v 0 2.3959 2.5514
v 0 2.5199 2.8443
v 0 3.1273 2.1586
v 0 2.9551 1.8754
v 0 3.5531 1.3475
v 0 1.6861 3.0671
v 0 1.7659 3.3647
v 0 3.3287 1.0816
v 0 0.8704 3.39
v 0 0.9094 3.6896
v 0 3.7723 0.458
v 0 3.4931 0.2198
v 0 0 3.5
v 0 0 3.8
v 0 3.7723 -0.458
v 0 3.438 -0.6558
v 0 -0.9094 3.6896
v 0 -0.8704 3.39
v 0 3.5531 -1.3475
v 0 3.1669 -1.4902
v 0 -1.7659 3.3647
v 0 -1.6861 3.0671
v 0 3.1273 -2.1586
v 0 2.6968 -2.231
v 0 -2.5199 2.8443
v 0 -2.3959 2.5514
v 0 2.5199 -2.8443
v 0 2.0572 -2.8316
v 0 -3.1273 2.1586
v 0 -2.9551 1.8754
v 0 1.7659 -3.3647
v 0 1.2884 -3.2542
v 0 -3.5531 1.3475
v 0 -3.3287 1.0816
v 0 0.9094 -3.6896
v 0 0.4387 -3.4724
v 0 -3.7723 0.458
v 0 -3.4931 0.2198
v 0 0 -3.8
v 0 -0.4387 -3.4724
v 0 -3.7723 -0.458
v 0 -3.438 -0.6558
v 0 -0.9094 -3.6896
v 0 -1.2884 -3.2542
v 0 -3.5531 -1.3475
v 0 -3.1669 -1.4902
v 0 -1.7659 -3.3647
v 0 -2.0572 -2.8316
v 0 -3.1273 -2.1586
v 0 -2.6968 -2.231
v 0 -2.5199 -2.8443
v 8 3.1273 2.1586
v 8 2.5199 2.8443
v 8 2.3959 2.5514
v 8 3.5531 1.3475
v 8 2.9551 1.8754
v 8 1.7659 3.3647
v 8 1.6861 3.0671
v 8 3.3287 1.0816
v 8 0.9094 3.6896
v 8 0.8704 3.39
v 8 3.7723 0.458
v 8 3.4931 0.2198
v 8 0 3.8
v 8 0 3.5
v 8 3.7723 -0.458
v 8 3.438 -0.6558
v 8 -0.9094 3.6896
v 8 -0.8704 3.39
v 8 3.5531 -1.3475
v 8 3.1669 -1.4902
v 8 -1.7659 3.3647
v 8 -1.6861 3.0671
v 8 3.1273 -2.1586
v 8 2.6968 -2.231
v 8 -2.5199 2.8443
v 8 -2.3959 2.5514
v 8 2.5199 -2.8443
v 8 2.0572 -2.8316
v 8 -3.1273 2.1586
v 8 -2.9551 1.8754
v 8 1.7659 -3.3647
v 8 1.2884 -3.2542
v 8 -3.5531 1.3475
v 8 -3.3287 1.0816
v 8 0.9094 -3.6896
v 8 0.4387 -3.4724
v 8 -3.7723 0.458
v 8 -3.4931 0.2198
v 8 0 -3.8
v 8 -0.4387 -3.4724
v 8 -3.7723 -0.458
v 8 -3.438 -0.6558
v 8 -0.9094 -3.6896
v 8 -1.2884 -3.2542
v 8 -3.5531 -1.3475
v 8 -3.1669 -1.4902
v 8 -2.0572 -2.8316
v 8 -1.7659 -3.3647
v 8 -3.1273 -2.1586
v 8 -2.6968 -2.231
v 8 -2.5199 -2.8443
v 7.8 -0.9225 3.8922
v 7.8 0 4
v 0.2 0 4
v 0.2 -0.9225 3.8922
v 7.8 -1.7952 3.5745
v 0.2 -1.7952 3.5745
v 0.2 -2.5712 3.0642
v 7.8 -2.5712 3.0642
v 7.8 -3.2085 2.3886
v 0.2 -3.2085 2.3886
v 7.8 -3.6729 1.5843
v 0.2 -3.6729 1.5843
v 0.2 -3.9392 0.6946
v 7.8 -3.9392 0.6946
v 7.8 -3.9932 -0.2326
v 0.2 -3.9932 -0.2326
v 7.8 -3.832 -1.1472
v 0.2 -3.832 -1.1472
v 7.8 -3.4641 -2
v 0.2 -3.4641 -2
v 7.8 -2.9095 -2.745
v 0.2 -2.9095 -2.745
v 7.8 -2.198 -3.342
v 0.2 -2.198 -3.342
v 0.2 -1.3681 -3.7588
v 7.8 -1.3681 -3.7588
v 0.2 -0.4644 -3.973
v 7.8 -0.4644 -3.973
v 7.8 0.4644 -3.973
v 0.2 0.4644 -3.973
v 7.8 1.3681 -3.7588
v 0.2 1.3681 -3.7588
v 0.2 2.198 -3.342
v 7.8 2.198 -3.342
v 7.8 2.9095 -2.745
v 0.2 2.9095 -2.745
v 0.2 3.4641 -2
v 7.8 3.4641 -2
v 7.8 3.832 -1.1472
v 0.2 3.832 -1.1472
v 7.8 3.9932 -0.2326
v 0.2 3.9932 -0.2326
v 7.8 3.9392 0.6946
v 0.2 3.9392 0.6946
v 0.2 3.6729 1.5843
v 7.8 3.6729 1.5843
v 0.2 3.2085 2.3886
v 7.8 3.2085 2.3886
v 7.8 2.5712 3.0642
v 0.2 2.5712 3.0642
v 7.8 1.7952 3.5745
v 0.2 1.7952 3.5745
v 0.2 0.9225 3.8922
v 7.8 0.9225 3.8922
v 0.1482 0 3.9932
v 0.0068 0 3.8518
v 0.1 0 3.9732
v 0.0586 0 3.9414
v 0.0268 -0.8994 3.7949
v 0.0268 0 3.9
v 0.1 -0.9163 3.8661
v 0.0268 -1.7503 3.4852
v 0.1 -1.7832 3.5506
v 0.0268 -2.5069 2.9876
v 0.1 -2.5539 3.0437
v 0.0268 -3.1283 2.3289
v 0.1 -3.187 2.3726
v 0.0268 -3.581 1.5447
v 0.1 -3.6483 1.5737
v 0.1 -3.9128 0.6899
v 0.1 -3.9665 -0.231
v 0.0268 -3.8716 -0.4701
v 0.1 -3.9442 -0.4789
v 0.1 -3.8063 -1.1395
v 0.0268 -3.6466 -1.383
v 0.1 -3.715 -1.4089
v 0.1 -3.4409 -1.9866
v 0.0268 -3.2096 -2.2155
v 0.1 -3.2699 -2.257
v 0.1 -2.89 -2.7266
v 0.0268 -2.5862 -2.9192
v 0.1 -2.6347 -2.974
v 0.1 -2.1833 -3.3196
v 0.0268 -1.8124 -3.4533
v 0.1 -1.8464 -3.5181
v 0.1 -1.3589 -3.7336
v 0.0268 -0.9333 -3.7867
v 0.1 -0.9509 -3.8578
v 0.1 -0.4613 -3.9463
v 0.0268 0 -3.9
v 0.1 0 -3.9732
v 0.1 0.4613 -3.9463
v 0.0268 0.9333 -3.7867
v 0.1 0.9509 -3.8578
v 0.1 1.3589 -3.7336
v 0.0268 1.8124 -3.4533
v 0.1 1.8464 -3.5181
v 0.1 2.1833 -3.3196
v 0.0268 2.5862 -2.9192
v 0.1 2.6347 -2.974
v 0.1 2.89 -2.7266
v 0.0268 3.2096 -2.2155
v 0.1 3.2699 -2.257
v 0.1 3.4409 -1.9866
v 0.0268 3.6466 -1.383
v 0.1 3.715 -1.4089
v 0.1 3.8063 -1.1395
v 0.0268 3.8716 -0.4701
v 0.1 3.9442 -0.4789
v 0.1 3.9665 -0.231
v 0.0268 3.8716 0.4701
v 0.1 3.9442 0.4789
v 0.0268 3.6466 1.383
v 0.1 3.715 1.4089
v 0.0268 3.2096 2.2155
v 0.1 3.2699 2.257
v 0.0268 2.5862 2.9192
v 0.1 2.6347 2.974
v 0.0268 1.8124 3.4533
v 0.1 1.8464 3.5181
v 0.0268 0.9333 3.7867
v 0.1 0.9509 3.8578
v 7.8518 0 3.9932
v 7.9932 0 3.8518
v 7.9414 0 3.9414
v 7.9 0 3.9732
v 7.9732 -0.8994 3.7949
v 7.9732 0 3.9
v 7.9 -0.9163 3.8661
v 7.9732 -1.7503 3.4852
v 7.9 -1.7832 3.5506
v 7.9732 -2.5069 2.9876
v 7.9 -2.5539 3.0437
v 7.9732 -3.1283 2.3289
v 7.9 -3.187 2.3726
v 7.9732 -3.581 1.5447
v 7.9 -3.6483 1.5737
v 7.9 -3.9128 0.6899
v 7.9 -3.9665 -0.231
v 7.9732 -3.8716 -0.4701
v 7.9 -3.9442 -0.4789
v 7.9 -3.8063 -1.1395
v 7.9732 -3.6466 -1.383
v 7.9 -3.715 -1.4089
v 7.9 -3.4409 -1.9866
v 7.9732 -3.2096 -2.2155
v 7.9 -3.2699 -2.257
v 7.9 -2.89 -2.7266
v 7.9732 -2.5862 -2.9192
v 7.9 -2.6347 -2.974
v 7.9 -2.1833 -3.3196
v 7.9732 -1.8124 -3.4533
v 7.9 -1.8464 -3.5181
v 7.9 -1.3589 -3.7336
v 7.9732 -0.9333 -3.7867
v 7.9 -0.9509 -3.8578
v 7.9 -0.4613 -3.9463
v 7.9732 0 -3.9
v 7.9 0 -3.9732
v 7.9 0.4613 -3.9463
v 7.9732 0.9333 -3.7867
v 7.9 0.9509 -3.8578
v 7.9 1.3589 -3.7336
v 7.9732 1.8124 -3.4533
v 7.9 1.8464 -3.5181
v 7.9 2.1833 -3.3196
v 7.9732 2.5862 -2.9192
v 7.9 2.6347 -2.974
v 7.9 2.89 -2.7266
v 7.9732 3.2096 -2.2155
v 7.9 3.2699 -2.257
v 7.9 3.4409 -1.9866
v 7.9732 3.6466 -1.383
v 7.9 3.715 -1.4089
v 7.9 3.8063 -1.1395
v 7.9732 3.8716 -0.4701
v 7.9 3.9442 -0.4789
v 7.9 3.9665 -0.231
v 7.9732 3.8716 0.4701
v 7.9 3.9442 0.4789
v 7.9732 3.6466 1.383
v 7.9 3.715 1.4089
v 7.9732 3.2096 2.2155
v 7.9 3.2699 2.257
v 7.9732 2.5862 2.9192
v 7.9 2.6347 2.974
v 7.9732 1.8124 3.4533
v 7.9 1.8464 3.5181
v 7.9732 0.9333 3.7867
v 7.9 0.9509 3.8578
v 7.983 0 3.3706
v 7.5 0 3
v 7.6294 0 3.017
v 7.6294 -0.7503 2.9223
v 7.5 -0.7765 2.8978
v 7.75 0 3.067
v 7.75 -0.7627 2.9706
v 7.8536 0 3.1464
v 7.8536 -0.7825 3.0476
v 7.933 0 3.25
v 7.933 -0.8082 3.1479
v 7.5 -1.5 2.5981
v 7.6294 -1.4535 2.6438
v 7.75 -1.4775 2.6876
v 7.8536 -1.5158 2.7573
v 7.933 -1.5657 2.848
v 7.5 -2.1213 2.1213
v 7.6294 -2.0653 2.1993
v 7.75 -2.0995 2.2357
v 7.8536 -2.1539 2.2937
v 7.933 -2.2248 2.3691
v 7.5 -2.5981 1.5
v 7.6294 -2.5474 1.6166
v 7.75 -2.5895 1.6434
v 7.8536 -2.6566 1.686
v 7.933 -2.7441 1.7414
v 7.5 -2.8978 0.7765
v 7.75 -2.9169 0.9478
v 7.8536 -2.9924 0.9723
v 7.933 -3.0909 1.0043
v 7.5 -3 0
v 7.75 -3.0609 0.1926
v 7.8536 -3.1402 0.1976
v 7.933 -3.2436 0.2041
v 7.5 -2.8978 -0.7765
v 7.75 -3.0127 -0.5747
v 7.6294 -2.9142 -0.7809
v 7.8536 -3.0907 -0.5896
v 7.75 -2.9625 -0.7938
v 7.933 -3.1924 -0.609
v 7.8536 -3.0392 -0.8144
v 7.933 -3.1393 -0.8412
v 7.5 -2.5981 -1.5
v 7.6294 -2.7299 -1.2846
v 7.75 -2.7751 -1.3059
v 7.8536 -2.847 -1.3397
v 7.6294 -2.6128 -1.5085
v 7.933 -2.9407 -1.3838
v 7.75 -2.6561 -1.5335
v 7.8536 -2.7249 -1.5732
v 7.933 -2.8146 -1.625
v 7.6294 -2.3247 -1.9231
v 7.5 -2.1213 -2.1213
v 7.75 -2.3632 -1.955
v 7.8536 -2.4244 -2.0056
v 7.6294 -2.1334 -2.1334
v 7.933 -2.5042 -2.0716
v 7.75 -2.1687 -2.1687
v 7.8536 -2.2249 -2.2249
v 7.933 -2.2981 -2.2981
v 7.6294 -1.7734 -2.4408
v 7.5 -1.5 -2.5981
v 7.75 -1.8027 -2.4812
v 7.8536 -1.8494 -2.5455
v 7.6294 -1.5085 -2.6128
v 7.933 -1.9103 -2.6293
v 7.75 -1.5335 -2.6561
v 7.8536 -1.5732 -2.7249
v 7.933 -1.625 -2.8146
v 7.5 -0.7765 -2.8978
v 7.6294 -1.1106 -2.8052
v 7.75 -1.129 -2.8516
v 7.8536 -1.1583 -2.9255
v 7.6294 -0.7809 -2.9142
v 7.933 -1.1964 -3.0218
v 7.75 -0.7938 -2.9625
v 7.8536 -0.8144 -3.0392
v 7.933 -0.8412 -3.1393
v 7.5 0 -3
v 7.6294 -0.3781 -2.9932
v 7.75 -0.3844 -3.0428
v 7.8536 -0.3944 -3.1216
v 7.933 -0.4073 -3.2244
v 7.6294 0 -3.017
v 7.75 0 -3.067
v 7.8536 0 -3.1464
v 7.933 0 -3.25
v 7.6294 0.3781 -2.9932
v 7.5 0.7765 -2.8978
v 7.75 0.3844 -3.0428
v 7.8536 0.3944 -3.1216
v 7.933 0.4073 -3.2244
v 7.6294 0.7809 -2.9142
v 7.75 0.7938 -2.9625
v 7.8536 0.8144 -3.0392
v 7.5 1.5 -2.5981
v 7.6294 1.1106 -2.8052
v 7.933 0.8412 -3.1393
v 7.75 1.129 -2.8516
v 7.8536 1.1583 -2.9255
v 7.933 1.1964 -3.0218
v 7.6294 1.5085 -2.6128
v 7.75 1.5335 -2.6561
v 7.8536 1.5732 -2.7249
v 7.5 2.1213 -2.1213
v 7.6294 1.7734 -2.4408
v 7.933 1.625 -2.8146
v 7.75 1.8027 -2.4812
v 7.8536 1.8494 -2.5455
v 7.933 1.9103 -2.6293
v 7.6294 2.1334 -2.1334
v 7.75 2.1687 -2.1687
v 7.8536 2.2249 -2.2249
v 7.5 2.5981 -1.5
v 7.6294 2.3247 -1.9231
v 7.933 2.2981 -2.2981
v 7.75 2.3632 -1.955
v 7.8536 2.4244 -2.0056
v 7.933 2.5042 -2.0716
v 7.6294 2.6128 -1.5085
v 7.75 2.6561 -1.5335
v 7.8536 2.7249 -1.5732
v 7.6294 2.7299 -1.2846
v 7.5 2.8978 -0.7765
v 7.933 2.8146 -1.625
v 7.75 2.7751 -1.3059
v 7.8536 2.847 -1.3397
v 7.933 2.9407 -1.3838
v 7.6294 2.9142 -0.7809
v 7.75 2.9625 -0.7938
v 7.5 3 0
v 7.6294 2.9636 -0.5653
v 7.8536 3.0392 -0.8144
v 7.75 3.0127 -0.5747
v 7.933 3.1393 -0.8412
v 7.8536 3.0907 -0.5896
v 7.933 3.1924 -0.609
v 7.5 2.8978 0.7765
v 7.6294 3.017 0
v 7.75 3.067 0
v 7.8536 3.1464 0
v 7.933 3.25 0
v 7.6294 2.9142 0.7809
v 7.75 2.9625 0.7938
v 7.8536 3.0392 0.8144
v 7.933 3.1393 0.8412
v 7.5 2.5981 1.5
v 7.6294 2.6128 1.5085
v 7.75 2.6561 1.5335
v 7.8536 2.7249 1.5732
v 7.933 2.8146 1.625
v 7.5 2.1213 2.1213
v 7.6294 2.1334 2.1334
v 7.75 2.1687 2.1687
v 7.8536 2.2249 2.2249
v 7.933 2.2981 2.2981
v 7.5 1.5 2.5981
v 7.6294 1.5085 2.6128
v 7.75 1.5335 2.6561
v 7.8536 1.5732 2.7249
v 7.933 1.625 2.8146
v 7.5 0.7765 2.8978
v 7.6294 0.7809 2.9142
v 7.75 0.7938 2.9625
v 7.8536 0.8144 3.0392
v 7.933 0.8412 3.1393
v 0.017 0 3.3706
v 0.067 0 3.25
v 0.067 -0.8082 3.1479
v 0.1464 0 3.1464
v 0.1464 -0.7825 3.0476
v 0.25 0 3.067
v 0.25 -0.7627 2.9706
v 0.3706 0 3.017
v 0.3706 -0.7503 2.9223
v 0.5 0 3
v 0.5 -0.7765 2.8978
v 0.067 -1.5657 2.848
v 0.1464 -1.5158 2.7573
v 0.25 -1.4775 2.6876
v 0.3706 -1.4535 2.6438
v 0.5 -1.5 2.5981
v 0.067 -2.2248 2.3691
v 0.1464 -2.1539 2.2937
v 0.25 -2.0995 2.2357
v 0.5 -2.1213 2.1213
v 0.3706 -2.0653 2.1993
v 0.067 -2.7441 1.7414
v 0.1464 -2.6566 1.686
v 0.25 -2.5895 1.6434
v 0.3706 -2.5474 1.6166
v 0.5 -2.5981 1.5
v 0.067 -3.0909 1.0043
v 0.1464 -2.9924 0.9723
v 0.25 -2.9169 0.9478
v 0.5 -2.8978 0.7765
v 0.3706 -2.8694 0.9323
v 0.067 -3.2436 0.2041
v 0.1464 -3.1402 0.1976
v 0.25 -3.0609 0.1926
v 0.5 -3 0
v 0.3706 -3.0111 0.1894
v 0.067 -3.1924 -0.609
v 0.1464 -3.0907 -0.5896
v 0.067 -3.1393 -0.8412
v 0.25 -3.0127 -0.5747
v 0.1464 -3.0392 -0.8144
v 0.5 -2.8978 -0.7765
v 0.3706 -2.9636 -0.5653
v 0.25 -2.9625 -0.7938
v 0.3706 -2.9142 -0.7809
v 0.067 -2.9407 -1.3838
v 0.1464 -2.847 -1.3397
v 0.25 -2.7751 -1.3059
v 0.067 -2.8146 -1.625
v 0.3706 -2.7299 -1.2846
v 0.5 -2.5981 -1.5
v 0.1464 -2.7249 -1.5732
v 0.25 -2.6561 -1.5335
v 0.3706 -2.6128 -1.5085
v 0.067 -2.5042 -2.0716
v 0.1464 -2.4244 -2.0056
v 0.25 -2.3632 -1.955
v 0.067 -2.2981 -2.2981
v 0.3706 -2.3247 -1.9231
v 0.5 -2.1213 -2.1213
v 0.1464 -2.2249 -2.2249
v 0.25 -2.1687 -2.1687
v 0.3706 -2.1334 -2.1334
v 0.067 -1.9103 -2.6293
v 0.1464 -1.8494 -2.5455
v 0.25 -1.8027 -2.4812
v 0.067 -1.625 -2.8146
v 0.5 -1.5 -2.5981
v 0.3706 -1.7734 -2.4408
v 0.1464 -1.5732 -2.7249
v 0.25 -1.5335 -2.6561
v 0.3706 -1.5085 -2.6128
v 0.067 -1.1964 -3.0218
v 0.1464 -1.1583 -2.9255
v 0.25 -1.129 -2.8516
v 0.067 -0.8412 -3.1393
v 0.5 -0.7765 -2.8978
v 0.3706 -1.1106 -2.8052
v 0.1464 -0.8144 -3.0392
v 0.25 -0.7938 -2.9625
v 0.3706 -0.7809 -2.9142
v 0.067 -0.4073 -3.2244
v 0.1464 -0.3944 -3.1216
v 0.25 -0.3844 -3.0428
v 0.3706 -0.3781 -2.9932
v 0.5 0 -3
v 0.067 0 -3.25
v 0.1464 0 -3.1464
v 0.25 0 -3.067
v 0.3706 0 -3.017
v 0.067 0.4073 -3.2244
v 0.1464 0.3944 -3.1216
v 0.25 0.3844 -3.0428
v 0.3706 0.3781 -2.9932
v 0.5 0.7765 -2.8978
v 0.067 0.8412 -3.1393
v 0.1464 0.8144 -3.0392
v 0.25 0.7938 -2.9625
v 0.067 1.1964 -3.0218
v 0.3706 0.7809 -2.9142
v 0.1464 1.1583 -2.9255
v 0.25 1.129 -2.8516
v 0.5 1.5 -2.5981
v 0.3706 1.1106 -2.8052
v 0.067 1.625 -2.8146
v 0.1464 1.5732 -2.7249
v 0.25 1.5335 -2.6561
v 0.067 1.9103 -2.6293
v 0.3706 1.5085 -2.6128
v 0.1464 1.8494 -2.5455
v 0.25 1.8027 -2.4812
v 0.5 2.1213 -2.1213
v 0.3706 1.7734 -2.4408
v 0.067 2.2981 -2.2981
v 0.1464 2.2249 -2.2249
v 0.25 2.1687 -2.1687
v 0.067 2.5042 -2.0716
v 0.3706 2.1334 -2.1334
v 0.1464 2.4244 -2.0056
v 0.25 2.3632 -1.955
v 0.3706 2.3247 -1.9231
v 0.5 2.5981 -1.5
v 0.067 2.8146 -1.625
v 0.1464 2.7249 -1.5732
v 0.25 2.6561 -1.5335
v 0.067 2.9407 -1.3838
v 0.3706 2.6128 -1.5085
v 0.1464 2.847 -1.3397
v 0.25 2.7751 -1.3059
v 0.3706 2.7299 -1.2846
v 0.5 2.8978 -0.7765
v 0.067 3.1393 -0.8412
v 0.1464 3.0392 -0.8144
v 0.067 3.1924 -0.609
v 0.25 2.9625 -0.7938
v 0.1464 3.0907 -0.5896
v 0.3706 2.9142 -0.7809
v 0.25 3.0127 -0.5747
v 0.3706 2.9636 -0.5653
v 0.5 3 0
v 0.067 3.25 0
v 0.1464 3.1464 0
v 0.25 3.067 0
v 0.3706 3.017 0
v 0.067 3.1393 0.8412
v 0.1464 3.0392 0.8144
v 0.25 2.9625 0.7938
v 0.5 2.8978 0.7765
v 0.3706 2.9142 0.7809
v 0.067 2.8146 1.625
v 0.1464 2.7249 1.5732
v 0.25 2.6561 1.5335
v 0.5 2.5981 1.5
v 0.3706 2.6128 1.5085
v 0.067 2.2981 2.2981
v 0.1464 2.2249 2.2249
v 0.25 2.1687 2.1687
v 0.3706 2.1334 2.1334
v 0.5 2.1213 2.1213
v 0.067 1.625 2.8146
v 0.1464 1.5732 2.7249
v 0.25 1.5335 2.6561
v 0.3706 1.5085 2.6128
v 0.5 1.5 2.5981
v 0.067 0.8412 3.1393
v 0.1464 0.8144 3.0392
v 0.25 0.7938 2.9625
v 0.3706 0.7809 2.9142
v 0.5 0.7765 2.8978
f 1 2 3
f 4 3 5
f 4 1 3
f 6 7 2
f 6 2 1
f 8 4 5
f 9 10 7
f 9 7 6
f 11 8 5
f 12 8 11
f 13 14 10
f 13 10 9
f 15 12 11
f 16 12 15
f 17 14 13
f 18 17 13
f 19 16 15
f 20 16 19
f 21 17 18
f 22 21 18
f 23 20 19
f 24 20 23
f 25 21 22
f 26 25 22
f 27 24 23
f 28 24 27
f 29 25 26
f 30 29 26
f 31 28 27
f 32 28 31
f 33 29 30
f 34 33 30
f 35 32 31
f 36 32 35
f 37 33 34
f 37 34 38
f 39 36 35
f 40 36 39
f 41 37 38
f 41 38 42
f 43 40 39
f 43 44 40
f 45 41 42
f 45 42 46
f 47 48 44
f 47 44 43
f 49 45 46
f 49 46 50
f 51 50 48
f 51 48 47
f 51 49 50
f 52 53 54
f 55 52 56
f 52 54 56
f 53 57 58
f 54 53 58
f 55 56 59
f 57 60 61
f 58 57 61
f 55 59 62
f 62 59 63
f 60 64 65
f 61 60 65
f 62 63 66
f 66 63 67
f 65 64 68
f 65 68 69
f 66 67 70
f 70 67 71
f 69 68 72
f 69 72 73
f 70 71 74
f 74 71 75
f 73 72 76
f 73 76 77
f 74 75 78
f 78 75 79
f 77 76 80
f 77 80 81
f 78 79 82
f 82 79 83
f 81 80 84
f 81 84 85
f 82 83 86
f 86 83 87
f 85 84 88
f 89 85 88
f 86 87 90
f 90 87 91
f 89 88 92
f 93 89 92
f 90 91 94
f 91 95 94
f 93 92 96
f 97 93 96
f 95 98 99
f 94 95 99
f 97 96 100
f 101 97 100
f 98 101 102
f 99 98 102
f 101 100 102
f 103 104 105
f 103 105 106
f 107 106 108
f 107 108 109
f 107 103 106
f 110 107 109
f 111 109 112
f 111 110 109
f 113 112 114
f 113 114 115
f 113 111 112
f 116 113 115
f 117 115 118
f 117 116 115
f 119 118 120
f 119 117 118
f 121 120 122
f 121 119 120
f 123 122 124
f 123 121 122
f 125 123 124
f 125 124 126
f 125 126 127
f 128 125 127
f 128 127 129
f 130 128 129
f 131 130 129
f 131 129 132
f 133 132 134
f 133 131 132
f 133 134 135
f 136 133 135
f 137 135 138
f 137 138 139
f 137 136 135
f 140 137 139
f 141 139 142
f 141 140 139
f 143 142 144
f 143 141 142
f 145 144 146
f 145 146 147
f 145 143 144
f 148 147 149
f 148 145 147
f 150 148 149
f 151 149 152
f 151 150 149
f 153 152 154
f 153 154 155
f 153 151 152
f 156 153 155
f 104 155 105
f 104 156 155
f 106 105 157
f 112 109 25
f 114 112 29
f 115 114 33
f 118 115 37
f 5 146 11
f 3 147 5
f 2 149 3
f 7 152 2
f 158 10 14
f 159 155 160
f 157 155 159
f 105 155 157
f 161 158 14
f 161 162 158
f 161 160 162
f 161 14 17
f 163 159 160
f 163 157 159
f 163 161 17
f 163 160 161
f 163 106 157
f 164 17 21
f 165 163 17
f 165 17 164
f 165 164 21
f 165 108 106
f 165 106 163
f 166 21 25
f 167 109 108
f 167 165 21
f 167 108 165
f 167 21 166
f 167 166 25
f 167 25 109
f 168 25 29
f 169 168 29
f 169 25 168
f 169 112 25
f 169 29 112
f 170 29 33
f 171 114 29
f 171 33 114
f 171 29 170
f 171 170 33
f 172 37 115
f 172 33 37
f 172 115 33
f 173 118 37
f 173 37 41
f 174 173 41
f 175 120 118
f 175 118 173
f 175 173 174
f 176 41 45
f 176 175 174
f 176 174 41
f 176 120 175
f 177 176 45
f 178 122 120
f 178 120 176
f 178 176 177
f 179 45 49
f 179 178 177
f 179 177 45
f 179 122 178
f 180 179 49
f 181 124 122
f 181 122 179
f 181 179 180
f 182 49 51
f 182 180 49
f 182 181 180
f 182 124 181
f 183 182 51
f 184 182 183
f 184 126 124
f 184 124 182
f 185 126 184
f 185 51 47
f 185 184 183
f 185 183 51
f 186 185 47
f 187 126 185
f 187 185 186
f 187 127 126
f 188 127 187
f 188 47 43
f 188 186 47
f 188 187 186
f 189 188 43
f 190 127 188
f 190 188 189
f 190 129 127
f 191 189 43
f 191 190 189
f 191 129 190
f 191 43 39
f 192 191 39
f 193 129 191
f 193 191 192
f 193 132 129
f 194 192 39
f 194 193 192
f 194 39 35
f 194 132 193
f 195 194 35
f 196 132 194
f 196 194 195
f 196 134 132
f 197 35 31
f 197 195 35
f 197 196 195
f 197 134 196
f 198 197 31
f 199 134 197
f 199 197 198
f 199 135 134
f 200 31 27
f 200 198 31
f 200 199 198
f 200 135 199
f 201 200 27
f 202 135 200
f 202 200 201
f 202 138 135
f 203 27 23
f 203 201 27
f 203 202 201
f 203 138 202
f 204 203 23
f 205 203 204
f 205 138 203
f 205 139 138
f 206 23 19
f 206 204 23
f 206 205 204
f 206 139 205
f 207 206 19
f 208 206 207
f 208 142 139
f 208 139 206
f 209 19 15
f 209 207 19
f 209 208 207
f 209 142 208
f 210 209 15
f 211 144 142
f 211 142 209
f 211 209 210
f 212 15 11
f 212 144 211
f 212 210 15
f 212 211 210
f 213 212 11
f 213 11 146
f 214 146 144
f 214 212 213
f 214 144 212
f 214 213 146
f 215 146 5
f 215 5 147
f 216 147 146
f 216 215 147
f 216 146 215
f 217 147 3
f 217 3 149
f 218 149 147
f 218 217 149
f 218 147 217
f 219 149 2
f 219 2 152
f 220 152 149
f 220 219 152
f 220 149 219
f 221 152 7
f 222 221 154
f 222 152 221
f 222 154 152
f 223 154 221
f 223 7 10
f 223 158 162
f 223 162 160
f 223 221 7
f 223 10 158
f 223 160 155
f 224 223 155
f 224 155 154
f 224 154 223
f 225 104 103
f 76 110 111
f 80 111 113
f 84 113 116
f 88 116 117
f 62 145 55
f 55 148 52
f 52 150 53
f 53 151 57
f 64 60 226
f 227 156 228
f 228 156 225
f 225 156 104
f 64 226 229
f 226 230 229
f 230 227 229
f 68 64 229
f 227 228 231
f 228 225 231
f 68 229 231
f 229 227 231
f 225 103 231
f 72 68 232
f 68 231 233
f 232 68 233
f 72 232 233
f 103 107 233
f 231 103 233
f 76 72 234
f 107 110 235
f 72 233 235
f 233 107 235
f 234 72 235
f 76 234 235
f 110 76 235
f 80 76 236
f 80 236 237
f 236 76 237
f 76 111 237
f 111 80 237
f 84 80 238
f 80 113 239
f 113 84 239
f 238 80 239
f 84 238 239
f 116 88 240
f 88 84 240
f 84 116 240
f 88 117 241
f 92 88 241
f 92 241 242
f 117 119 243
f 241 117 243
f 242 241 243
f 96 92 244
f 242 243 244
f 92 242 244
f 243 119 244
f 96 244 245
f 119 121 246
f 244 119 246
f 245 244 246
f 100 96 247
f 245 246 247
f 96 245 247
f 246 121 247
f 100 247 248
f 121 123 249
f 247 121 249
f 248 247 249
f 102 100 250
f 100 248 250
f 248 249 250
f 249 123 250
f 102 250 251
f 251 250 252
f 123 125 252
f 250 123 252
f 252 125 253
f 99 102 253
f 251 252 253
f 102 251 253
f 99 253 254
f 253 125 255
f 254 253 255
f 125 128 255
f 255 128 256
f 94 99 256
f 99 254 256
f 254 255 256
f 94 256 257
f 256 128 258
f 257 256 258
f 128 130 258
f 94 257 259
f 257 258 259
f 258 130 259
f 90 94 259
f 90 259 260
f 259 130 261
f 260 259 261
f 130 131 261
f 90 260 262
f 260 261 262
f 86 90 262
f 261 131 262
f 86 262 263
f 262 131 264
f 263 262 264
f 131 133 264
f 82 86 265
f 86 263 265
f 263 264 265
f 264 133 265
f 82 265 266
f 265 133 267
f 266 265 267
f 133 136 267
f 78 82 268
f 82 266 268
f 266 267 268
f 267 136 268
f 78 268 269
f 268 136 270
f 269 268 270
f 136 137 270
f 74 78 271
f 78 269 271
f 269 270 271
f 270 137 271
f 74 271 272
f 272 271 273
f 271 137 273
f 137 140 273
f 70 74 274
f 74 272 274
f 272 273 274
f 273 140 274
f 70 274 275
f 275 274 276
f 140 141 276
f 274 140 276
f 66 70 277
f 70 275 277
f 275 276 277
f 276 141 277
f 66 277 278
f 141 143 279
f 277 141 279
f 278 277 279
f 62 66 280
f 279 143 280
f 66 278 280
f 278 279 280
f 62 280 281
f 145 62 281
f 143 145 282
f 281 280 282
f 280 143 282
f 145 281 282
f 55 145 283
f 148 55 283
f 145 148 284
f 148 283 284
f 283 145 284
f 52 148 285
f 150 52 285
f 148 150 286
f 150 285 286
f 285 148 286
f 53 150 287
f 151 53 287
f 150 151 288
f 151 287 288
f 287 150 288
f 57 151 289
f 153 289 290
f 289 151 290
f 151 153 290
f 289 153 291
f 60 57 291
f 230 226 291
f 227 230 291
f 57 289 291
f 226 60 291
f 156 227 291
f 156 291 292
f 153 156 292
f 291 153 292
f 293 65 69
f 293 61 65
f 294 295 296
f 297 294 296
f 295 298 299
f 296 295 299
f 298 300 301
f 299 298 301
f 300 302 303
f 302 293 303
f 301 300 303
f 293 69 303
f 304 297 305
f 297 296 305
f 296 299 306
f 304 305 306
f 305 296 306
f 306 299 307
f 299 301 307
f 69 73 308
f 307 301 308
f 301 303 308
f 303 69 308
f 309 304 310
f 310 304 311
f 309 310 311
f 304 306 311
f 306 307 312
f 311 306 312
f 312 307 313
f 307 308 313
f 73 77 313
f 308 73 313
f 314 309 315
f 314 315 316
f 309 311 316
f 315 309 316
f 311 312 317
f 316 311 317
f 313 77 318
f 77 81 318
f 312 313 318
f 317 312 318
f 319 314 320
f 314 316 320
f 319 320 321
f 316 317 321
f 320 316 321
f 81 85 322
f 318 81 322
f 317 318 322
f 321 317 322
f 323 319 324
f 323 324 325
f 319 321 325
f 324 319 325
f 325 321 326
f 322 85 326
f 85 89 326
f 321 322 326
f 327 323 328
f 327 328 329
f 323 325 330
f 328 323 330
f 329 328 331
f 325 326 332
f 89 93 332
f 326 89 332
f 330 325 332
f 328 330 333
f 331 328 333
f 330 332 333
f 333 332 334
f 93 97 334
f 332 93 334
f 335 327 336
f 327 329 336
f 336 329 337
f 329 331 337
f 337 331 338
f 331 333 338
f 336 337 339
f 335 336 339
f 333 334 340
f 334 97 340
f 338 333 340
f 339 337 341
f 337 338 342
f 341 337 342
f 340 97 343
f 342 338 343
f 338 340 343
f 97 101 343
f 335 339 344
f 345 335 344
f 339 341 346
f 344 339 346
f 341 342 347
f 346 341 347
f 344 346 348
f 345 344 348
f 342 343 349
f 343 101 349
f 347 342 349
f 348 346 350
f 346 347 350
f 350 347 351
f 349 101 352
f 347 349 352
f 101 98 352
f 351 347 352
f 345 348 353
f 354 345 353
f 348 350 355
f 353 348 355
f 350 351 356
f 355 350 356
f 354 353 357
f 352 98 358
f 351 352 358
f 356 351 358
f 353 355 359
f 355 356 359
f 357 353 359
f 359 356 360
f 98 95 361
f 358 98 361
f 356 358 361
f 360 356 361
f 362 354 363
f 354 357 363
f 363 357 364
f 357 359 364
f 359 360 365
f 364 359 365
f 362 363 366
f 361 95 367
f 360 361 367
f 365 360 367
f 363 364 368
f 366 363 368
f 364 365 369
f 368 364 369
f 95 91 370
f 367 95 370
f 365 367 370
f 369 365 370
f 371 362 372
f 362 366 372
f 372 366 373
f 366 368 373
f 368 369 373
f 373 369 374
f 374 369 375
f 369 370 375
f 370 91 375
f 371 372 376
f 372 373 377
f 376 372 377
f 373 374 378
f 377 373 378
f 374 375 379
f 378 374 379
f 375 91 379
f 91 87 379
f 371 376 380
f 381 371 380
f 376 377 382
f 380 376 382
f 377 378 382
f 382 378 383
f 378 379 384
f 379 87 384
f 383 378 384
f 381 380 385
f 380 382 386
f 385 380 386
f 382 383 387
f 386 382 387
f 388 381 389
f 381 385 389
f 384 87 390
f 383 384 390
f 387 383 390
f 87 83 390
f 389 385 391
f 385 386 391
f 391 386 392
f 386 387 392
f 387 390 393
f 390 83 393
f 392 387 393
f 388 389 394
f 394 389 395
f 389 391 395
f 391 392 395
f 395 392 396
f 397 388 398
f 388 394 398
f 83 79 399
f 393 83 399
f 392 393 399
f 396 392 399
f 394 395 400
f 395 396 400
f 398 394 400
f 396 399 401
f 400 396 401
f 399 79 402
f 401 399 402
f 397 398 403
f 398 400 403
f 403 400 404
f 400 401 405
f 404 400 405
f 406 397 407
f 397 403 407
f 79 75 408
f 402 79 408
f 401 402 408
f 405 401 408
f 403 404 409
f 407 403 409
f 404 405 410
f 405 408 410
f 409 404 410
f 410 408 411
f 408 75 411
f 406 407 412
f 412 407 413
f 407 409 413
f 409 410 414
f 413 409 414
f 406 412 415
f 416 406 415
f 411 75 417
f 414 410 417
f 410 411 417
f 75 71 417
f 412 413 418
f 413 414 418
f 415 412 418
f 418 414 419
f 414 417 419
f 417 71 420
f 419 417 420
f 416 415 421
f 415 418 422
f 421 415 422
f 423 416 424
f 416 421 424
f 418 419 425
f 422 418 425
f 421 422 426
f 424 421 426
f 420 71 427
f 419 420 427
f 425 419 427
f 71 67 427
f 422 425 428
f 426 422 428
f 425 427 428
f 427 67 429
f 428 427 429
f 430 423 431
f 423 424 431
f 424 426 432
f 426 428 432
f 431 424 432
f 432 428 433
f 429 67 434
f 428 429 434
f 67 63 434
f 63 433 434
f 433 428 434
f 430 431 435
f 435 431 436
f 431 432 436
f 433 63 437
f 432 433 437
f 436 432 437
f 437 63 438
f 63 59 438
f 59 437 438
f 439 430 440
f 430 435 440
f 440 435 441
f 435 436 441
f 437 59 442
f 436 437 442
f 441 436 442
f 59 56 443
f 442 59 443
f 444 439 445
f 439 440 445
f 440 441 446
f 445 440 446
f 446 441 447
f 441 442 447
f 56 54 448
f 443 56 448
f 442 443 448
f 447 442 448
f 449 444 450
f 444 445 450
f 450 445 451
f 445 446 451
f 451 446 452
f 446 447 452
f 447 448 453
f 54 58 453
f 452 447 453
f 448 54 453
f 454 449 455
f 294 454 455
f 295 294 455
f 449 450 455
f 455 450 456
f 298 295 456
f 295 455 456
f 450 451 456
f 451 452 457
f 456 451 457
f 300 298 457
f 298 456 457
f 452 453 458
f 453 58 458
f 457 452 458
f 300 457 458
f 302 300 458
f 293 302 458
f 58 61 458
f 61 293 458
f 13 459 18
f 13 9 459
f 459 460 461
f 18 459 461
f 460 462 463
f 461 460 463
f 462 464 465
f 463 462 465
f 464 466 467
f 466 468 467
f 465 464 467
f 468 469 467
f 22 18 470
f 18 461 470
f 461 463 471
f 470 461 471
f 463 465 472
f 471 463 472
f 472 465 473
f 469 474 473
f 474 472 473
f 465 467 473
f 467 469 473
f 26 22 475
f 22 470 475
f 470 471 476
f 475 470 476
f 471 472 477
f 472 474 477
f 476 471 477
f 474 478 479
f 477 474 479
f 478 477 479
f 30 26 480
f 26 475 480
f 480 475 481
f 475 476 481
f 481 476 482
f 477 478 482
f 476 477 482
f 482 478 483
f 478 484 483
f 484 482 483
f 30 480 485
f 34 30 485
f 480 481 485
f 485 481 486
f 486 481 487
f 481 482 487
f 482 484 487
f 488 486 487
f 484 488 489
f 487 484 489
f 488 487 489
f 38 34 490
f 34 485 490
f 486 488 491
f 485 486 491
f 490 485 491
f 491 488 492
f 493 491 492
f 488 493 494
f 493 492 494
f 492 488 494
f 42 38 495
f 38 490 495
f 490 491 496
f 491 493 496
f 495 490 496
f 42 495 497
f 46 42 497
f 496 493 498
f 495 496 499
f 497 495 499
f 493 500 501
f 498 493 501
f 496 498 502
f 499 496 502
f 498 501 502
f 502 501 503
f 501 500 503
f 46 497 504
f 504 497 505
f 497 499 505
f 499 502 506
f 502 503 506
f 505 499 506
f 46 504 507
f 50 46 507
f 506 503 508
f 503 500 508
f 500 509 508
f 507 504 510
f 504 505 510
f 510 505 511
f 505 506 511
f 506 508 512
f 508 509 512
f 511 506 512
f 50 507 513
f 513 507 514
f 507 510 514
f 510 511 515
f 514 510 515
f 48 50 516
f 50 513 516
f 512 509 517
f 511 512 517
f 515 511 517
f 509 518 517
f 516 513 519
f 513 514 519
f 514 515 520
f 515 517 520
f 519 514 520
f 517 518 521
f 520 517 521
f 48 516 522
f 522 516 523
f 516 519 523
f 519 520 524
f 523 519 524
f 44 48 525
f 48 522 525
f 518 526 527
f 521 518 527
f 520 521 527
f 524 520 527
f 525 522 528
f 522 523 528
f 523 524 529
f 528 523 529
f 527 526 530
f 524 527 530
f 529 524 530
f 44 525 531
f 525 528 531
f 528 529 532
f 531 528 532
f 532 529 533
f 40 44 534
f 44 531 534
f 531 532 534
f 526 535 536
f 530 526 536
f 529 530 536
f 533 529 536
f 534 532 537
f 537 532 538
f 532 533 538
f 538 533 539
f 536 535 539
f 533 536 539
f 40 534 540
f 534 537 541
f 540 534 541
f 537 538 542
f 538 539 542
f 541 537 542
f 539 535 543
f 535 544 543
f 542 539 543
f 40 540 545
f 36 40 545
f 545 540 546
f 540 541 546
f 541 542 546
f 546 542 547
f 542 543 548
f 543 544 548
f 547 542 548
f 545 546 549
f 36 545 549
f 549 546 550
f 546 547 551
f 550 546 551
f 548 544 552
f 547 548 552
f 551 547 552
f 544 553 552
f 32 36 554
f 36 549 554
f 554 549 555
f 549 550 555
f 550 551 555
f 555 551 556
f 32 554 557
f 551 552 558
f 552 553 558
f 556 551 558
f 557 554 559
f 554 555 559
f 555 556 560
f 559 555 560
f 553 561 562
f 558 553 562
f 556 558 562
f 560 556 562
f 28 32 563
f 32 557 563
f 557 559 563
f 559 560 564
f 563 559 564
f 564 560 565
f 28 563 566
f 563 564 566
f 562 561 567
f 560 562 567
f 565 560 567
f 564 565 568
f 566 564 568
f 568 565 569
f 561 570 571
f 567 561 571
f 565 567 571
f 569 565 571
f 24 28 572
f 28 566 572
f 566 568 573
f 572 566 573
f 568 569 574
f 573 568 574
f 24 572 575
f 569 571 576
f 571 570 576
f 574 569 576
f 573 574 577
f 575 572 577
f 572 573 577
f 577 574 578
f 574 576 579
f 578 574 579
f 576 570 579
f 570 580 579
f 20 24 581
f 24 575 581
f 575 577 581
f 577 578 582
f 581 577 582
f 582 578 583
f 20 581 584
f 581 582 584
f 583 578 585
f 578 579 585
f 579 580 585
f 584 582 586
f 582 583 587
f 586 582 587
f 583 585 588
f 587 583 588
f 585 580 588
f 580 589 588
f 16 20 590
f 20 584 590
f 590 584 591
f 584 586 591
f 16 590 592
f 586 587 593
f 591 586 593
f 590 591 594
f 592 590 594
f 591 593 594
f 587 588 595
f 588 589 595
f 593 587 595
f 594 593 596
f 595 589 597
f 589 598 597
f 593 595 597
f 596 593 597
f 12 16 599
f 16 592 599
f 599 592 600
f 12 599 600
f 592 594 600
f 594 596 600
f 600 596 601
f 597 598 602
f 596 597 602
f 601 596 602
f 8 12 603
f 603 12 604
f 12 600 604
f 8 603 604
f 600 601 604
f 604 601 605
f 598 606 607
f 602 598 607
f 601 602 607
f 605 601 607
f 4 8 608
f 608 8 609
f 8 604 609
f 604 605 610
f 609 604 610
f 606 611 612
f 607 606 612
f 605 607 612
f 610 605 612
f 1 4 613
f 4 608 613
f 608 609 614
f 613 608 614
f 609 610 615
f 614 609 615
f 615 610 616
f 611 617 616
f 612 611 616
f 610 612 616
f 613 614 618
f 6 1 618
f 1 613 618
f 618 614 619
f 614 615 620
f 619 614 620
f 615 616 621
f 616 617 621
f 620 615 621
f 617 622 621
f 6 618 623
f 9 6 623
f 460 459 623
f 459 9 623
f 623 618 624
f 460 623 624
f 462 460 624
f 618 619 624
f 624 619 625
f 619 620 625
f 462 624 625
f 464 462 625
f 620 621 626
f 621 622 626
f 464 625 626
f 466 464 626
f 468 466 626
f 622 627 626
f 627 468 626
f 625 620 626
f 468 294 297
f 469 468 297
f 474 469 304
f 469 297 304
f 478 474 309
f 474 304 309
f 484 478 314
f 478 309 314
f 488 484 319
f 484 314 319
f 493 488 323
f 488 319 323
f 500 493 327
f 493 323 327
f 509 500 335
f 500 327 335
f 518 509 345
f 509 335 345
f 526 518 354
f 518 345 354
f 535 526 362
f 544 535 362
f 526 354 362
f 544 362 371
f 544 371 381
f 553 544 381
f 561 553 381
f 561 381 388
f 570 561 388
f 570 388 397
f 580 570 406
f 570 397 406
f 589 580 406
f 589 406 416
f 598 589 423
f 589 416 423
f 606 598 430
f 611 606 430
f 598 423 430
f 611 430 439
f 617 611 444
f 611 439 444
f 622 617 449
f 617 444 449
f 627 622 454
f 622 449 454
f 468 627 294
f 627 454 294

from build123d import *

# Parameters (mm, degrees)
SKETCH1_W = 8
SKETCH1_H = 1
FILLET2_R = 0.2
FILLET3_R = 0.5


with BuildPart() as part:
    # Sketch1 → Revolve1 (revolve)
    with BuildSketch(Plane.XY):
        with Locations((4, 3.5)):
            Rectangle(SKETCH1_W, SKETCH1_H)
    revolve(axis=Axis((0, 0, 0), (1, 0, 0)))

    # Fillet2
    fillet2_edges = [part.edges().sort_by_distance(p)[0] for p in [
        (8, -4, 0),
        (0, -4, 0),
    ]]
    fillet(fillet2_edges, radius=FILLET2_R)

    # Fillet3
    fillet3_edges = [part.edges().sort_by_distance(p)[0] for p in [
        (8, -3, 0),
        (0, -3, 0),
    ]]
    fillet(fillet3_edges, radius=FILLET3_R)


solid = part.part
